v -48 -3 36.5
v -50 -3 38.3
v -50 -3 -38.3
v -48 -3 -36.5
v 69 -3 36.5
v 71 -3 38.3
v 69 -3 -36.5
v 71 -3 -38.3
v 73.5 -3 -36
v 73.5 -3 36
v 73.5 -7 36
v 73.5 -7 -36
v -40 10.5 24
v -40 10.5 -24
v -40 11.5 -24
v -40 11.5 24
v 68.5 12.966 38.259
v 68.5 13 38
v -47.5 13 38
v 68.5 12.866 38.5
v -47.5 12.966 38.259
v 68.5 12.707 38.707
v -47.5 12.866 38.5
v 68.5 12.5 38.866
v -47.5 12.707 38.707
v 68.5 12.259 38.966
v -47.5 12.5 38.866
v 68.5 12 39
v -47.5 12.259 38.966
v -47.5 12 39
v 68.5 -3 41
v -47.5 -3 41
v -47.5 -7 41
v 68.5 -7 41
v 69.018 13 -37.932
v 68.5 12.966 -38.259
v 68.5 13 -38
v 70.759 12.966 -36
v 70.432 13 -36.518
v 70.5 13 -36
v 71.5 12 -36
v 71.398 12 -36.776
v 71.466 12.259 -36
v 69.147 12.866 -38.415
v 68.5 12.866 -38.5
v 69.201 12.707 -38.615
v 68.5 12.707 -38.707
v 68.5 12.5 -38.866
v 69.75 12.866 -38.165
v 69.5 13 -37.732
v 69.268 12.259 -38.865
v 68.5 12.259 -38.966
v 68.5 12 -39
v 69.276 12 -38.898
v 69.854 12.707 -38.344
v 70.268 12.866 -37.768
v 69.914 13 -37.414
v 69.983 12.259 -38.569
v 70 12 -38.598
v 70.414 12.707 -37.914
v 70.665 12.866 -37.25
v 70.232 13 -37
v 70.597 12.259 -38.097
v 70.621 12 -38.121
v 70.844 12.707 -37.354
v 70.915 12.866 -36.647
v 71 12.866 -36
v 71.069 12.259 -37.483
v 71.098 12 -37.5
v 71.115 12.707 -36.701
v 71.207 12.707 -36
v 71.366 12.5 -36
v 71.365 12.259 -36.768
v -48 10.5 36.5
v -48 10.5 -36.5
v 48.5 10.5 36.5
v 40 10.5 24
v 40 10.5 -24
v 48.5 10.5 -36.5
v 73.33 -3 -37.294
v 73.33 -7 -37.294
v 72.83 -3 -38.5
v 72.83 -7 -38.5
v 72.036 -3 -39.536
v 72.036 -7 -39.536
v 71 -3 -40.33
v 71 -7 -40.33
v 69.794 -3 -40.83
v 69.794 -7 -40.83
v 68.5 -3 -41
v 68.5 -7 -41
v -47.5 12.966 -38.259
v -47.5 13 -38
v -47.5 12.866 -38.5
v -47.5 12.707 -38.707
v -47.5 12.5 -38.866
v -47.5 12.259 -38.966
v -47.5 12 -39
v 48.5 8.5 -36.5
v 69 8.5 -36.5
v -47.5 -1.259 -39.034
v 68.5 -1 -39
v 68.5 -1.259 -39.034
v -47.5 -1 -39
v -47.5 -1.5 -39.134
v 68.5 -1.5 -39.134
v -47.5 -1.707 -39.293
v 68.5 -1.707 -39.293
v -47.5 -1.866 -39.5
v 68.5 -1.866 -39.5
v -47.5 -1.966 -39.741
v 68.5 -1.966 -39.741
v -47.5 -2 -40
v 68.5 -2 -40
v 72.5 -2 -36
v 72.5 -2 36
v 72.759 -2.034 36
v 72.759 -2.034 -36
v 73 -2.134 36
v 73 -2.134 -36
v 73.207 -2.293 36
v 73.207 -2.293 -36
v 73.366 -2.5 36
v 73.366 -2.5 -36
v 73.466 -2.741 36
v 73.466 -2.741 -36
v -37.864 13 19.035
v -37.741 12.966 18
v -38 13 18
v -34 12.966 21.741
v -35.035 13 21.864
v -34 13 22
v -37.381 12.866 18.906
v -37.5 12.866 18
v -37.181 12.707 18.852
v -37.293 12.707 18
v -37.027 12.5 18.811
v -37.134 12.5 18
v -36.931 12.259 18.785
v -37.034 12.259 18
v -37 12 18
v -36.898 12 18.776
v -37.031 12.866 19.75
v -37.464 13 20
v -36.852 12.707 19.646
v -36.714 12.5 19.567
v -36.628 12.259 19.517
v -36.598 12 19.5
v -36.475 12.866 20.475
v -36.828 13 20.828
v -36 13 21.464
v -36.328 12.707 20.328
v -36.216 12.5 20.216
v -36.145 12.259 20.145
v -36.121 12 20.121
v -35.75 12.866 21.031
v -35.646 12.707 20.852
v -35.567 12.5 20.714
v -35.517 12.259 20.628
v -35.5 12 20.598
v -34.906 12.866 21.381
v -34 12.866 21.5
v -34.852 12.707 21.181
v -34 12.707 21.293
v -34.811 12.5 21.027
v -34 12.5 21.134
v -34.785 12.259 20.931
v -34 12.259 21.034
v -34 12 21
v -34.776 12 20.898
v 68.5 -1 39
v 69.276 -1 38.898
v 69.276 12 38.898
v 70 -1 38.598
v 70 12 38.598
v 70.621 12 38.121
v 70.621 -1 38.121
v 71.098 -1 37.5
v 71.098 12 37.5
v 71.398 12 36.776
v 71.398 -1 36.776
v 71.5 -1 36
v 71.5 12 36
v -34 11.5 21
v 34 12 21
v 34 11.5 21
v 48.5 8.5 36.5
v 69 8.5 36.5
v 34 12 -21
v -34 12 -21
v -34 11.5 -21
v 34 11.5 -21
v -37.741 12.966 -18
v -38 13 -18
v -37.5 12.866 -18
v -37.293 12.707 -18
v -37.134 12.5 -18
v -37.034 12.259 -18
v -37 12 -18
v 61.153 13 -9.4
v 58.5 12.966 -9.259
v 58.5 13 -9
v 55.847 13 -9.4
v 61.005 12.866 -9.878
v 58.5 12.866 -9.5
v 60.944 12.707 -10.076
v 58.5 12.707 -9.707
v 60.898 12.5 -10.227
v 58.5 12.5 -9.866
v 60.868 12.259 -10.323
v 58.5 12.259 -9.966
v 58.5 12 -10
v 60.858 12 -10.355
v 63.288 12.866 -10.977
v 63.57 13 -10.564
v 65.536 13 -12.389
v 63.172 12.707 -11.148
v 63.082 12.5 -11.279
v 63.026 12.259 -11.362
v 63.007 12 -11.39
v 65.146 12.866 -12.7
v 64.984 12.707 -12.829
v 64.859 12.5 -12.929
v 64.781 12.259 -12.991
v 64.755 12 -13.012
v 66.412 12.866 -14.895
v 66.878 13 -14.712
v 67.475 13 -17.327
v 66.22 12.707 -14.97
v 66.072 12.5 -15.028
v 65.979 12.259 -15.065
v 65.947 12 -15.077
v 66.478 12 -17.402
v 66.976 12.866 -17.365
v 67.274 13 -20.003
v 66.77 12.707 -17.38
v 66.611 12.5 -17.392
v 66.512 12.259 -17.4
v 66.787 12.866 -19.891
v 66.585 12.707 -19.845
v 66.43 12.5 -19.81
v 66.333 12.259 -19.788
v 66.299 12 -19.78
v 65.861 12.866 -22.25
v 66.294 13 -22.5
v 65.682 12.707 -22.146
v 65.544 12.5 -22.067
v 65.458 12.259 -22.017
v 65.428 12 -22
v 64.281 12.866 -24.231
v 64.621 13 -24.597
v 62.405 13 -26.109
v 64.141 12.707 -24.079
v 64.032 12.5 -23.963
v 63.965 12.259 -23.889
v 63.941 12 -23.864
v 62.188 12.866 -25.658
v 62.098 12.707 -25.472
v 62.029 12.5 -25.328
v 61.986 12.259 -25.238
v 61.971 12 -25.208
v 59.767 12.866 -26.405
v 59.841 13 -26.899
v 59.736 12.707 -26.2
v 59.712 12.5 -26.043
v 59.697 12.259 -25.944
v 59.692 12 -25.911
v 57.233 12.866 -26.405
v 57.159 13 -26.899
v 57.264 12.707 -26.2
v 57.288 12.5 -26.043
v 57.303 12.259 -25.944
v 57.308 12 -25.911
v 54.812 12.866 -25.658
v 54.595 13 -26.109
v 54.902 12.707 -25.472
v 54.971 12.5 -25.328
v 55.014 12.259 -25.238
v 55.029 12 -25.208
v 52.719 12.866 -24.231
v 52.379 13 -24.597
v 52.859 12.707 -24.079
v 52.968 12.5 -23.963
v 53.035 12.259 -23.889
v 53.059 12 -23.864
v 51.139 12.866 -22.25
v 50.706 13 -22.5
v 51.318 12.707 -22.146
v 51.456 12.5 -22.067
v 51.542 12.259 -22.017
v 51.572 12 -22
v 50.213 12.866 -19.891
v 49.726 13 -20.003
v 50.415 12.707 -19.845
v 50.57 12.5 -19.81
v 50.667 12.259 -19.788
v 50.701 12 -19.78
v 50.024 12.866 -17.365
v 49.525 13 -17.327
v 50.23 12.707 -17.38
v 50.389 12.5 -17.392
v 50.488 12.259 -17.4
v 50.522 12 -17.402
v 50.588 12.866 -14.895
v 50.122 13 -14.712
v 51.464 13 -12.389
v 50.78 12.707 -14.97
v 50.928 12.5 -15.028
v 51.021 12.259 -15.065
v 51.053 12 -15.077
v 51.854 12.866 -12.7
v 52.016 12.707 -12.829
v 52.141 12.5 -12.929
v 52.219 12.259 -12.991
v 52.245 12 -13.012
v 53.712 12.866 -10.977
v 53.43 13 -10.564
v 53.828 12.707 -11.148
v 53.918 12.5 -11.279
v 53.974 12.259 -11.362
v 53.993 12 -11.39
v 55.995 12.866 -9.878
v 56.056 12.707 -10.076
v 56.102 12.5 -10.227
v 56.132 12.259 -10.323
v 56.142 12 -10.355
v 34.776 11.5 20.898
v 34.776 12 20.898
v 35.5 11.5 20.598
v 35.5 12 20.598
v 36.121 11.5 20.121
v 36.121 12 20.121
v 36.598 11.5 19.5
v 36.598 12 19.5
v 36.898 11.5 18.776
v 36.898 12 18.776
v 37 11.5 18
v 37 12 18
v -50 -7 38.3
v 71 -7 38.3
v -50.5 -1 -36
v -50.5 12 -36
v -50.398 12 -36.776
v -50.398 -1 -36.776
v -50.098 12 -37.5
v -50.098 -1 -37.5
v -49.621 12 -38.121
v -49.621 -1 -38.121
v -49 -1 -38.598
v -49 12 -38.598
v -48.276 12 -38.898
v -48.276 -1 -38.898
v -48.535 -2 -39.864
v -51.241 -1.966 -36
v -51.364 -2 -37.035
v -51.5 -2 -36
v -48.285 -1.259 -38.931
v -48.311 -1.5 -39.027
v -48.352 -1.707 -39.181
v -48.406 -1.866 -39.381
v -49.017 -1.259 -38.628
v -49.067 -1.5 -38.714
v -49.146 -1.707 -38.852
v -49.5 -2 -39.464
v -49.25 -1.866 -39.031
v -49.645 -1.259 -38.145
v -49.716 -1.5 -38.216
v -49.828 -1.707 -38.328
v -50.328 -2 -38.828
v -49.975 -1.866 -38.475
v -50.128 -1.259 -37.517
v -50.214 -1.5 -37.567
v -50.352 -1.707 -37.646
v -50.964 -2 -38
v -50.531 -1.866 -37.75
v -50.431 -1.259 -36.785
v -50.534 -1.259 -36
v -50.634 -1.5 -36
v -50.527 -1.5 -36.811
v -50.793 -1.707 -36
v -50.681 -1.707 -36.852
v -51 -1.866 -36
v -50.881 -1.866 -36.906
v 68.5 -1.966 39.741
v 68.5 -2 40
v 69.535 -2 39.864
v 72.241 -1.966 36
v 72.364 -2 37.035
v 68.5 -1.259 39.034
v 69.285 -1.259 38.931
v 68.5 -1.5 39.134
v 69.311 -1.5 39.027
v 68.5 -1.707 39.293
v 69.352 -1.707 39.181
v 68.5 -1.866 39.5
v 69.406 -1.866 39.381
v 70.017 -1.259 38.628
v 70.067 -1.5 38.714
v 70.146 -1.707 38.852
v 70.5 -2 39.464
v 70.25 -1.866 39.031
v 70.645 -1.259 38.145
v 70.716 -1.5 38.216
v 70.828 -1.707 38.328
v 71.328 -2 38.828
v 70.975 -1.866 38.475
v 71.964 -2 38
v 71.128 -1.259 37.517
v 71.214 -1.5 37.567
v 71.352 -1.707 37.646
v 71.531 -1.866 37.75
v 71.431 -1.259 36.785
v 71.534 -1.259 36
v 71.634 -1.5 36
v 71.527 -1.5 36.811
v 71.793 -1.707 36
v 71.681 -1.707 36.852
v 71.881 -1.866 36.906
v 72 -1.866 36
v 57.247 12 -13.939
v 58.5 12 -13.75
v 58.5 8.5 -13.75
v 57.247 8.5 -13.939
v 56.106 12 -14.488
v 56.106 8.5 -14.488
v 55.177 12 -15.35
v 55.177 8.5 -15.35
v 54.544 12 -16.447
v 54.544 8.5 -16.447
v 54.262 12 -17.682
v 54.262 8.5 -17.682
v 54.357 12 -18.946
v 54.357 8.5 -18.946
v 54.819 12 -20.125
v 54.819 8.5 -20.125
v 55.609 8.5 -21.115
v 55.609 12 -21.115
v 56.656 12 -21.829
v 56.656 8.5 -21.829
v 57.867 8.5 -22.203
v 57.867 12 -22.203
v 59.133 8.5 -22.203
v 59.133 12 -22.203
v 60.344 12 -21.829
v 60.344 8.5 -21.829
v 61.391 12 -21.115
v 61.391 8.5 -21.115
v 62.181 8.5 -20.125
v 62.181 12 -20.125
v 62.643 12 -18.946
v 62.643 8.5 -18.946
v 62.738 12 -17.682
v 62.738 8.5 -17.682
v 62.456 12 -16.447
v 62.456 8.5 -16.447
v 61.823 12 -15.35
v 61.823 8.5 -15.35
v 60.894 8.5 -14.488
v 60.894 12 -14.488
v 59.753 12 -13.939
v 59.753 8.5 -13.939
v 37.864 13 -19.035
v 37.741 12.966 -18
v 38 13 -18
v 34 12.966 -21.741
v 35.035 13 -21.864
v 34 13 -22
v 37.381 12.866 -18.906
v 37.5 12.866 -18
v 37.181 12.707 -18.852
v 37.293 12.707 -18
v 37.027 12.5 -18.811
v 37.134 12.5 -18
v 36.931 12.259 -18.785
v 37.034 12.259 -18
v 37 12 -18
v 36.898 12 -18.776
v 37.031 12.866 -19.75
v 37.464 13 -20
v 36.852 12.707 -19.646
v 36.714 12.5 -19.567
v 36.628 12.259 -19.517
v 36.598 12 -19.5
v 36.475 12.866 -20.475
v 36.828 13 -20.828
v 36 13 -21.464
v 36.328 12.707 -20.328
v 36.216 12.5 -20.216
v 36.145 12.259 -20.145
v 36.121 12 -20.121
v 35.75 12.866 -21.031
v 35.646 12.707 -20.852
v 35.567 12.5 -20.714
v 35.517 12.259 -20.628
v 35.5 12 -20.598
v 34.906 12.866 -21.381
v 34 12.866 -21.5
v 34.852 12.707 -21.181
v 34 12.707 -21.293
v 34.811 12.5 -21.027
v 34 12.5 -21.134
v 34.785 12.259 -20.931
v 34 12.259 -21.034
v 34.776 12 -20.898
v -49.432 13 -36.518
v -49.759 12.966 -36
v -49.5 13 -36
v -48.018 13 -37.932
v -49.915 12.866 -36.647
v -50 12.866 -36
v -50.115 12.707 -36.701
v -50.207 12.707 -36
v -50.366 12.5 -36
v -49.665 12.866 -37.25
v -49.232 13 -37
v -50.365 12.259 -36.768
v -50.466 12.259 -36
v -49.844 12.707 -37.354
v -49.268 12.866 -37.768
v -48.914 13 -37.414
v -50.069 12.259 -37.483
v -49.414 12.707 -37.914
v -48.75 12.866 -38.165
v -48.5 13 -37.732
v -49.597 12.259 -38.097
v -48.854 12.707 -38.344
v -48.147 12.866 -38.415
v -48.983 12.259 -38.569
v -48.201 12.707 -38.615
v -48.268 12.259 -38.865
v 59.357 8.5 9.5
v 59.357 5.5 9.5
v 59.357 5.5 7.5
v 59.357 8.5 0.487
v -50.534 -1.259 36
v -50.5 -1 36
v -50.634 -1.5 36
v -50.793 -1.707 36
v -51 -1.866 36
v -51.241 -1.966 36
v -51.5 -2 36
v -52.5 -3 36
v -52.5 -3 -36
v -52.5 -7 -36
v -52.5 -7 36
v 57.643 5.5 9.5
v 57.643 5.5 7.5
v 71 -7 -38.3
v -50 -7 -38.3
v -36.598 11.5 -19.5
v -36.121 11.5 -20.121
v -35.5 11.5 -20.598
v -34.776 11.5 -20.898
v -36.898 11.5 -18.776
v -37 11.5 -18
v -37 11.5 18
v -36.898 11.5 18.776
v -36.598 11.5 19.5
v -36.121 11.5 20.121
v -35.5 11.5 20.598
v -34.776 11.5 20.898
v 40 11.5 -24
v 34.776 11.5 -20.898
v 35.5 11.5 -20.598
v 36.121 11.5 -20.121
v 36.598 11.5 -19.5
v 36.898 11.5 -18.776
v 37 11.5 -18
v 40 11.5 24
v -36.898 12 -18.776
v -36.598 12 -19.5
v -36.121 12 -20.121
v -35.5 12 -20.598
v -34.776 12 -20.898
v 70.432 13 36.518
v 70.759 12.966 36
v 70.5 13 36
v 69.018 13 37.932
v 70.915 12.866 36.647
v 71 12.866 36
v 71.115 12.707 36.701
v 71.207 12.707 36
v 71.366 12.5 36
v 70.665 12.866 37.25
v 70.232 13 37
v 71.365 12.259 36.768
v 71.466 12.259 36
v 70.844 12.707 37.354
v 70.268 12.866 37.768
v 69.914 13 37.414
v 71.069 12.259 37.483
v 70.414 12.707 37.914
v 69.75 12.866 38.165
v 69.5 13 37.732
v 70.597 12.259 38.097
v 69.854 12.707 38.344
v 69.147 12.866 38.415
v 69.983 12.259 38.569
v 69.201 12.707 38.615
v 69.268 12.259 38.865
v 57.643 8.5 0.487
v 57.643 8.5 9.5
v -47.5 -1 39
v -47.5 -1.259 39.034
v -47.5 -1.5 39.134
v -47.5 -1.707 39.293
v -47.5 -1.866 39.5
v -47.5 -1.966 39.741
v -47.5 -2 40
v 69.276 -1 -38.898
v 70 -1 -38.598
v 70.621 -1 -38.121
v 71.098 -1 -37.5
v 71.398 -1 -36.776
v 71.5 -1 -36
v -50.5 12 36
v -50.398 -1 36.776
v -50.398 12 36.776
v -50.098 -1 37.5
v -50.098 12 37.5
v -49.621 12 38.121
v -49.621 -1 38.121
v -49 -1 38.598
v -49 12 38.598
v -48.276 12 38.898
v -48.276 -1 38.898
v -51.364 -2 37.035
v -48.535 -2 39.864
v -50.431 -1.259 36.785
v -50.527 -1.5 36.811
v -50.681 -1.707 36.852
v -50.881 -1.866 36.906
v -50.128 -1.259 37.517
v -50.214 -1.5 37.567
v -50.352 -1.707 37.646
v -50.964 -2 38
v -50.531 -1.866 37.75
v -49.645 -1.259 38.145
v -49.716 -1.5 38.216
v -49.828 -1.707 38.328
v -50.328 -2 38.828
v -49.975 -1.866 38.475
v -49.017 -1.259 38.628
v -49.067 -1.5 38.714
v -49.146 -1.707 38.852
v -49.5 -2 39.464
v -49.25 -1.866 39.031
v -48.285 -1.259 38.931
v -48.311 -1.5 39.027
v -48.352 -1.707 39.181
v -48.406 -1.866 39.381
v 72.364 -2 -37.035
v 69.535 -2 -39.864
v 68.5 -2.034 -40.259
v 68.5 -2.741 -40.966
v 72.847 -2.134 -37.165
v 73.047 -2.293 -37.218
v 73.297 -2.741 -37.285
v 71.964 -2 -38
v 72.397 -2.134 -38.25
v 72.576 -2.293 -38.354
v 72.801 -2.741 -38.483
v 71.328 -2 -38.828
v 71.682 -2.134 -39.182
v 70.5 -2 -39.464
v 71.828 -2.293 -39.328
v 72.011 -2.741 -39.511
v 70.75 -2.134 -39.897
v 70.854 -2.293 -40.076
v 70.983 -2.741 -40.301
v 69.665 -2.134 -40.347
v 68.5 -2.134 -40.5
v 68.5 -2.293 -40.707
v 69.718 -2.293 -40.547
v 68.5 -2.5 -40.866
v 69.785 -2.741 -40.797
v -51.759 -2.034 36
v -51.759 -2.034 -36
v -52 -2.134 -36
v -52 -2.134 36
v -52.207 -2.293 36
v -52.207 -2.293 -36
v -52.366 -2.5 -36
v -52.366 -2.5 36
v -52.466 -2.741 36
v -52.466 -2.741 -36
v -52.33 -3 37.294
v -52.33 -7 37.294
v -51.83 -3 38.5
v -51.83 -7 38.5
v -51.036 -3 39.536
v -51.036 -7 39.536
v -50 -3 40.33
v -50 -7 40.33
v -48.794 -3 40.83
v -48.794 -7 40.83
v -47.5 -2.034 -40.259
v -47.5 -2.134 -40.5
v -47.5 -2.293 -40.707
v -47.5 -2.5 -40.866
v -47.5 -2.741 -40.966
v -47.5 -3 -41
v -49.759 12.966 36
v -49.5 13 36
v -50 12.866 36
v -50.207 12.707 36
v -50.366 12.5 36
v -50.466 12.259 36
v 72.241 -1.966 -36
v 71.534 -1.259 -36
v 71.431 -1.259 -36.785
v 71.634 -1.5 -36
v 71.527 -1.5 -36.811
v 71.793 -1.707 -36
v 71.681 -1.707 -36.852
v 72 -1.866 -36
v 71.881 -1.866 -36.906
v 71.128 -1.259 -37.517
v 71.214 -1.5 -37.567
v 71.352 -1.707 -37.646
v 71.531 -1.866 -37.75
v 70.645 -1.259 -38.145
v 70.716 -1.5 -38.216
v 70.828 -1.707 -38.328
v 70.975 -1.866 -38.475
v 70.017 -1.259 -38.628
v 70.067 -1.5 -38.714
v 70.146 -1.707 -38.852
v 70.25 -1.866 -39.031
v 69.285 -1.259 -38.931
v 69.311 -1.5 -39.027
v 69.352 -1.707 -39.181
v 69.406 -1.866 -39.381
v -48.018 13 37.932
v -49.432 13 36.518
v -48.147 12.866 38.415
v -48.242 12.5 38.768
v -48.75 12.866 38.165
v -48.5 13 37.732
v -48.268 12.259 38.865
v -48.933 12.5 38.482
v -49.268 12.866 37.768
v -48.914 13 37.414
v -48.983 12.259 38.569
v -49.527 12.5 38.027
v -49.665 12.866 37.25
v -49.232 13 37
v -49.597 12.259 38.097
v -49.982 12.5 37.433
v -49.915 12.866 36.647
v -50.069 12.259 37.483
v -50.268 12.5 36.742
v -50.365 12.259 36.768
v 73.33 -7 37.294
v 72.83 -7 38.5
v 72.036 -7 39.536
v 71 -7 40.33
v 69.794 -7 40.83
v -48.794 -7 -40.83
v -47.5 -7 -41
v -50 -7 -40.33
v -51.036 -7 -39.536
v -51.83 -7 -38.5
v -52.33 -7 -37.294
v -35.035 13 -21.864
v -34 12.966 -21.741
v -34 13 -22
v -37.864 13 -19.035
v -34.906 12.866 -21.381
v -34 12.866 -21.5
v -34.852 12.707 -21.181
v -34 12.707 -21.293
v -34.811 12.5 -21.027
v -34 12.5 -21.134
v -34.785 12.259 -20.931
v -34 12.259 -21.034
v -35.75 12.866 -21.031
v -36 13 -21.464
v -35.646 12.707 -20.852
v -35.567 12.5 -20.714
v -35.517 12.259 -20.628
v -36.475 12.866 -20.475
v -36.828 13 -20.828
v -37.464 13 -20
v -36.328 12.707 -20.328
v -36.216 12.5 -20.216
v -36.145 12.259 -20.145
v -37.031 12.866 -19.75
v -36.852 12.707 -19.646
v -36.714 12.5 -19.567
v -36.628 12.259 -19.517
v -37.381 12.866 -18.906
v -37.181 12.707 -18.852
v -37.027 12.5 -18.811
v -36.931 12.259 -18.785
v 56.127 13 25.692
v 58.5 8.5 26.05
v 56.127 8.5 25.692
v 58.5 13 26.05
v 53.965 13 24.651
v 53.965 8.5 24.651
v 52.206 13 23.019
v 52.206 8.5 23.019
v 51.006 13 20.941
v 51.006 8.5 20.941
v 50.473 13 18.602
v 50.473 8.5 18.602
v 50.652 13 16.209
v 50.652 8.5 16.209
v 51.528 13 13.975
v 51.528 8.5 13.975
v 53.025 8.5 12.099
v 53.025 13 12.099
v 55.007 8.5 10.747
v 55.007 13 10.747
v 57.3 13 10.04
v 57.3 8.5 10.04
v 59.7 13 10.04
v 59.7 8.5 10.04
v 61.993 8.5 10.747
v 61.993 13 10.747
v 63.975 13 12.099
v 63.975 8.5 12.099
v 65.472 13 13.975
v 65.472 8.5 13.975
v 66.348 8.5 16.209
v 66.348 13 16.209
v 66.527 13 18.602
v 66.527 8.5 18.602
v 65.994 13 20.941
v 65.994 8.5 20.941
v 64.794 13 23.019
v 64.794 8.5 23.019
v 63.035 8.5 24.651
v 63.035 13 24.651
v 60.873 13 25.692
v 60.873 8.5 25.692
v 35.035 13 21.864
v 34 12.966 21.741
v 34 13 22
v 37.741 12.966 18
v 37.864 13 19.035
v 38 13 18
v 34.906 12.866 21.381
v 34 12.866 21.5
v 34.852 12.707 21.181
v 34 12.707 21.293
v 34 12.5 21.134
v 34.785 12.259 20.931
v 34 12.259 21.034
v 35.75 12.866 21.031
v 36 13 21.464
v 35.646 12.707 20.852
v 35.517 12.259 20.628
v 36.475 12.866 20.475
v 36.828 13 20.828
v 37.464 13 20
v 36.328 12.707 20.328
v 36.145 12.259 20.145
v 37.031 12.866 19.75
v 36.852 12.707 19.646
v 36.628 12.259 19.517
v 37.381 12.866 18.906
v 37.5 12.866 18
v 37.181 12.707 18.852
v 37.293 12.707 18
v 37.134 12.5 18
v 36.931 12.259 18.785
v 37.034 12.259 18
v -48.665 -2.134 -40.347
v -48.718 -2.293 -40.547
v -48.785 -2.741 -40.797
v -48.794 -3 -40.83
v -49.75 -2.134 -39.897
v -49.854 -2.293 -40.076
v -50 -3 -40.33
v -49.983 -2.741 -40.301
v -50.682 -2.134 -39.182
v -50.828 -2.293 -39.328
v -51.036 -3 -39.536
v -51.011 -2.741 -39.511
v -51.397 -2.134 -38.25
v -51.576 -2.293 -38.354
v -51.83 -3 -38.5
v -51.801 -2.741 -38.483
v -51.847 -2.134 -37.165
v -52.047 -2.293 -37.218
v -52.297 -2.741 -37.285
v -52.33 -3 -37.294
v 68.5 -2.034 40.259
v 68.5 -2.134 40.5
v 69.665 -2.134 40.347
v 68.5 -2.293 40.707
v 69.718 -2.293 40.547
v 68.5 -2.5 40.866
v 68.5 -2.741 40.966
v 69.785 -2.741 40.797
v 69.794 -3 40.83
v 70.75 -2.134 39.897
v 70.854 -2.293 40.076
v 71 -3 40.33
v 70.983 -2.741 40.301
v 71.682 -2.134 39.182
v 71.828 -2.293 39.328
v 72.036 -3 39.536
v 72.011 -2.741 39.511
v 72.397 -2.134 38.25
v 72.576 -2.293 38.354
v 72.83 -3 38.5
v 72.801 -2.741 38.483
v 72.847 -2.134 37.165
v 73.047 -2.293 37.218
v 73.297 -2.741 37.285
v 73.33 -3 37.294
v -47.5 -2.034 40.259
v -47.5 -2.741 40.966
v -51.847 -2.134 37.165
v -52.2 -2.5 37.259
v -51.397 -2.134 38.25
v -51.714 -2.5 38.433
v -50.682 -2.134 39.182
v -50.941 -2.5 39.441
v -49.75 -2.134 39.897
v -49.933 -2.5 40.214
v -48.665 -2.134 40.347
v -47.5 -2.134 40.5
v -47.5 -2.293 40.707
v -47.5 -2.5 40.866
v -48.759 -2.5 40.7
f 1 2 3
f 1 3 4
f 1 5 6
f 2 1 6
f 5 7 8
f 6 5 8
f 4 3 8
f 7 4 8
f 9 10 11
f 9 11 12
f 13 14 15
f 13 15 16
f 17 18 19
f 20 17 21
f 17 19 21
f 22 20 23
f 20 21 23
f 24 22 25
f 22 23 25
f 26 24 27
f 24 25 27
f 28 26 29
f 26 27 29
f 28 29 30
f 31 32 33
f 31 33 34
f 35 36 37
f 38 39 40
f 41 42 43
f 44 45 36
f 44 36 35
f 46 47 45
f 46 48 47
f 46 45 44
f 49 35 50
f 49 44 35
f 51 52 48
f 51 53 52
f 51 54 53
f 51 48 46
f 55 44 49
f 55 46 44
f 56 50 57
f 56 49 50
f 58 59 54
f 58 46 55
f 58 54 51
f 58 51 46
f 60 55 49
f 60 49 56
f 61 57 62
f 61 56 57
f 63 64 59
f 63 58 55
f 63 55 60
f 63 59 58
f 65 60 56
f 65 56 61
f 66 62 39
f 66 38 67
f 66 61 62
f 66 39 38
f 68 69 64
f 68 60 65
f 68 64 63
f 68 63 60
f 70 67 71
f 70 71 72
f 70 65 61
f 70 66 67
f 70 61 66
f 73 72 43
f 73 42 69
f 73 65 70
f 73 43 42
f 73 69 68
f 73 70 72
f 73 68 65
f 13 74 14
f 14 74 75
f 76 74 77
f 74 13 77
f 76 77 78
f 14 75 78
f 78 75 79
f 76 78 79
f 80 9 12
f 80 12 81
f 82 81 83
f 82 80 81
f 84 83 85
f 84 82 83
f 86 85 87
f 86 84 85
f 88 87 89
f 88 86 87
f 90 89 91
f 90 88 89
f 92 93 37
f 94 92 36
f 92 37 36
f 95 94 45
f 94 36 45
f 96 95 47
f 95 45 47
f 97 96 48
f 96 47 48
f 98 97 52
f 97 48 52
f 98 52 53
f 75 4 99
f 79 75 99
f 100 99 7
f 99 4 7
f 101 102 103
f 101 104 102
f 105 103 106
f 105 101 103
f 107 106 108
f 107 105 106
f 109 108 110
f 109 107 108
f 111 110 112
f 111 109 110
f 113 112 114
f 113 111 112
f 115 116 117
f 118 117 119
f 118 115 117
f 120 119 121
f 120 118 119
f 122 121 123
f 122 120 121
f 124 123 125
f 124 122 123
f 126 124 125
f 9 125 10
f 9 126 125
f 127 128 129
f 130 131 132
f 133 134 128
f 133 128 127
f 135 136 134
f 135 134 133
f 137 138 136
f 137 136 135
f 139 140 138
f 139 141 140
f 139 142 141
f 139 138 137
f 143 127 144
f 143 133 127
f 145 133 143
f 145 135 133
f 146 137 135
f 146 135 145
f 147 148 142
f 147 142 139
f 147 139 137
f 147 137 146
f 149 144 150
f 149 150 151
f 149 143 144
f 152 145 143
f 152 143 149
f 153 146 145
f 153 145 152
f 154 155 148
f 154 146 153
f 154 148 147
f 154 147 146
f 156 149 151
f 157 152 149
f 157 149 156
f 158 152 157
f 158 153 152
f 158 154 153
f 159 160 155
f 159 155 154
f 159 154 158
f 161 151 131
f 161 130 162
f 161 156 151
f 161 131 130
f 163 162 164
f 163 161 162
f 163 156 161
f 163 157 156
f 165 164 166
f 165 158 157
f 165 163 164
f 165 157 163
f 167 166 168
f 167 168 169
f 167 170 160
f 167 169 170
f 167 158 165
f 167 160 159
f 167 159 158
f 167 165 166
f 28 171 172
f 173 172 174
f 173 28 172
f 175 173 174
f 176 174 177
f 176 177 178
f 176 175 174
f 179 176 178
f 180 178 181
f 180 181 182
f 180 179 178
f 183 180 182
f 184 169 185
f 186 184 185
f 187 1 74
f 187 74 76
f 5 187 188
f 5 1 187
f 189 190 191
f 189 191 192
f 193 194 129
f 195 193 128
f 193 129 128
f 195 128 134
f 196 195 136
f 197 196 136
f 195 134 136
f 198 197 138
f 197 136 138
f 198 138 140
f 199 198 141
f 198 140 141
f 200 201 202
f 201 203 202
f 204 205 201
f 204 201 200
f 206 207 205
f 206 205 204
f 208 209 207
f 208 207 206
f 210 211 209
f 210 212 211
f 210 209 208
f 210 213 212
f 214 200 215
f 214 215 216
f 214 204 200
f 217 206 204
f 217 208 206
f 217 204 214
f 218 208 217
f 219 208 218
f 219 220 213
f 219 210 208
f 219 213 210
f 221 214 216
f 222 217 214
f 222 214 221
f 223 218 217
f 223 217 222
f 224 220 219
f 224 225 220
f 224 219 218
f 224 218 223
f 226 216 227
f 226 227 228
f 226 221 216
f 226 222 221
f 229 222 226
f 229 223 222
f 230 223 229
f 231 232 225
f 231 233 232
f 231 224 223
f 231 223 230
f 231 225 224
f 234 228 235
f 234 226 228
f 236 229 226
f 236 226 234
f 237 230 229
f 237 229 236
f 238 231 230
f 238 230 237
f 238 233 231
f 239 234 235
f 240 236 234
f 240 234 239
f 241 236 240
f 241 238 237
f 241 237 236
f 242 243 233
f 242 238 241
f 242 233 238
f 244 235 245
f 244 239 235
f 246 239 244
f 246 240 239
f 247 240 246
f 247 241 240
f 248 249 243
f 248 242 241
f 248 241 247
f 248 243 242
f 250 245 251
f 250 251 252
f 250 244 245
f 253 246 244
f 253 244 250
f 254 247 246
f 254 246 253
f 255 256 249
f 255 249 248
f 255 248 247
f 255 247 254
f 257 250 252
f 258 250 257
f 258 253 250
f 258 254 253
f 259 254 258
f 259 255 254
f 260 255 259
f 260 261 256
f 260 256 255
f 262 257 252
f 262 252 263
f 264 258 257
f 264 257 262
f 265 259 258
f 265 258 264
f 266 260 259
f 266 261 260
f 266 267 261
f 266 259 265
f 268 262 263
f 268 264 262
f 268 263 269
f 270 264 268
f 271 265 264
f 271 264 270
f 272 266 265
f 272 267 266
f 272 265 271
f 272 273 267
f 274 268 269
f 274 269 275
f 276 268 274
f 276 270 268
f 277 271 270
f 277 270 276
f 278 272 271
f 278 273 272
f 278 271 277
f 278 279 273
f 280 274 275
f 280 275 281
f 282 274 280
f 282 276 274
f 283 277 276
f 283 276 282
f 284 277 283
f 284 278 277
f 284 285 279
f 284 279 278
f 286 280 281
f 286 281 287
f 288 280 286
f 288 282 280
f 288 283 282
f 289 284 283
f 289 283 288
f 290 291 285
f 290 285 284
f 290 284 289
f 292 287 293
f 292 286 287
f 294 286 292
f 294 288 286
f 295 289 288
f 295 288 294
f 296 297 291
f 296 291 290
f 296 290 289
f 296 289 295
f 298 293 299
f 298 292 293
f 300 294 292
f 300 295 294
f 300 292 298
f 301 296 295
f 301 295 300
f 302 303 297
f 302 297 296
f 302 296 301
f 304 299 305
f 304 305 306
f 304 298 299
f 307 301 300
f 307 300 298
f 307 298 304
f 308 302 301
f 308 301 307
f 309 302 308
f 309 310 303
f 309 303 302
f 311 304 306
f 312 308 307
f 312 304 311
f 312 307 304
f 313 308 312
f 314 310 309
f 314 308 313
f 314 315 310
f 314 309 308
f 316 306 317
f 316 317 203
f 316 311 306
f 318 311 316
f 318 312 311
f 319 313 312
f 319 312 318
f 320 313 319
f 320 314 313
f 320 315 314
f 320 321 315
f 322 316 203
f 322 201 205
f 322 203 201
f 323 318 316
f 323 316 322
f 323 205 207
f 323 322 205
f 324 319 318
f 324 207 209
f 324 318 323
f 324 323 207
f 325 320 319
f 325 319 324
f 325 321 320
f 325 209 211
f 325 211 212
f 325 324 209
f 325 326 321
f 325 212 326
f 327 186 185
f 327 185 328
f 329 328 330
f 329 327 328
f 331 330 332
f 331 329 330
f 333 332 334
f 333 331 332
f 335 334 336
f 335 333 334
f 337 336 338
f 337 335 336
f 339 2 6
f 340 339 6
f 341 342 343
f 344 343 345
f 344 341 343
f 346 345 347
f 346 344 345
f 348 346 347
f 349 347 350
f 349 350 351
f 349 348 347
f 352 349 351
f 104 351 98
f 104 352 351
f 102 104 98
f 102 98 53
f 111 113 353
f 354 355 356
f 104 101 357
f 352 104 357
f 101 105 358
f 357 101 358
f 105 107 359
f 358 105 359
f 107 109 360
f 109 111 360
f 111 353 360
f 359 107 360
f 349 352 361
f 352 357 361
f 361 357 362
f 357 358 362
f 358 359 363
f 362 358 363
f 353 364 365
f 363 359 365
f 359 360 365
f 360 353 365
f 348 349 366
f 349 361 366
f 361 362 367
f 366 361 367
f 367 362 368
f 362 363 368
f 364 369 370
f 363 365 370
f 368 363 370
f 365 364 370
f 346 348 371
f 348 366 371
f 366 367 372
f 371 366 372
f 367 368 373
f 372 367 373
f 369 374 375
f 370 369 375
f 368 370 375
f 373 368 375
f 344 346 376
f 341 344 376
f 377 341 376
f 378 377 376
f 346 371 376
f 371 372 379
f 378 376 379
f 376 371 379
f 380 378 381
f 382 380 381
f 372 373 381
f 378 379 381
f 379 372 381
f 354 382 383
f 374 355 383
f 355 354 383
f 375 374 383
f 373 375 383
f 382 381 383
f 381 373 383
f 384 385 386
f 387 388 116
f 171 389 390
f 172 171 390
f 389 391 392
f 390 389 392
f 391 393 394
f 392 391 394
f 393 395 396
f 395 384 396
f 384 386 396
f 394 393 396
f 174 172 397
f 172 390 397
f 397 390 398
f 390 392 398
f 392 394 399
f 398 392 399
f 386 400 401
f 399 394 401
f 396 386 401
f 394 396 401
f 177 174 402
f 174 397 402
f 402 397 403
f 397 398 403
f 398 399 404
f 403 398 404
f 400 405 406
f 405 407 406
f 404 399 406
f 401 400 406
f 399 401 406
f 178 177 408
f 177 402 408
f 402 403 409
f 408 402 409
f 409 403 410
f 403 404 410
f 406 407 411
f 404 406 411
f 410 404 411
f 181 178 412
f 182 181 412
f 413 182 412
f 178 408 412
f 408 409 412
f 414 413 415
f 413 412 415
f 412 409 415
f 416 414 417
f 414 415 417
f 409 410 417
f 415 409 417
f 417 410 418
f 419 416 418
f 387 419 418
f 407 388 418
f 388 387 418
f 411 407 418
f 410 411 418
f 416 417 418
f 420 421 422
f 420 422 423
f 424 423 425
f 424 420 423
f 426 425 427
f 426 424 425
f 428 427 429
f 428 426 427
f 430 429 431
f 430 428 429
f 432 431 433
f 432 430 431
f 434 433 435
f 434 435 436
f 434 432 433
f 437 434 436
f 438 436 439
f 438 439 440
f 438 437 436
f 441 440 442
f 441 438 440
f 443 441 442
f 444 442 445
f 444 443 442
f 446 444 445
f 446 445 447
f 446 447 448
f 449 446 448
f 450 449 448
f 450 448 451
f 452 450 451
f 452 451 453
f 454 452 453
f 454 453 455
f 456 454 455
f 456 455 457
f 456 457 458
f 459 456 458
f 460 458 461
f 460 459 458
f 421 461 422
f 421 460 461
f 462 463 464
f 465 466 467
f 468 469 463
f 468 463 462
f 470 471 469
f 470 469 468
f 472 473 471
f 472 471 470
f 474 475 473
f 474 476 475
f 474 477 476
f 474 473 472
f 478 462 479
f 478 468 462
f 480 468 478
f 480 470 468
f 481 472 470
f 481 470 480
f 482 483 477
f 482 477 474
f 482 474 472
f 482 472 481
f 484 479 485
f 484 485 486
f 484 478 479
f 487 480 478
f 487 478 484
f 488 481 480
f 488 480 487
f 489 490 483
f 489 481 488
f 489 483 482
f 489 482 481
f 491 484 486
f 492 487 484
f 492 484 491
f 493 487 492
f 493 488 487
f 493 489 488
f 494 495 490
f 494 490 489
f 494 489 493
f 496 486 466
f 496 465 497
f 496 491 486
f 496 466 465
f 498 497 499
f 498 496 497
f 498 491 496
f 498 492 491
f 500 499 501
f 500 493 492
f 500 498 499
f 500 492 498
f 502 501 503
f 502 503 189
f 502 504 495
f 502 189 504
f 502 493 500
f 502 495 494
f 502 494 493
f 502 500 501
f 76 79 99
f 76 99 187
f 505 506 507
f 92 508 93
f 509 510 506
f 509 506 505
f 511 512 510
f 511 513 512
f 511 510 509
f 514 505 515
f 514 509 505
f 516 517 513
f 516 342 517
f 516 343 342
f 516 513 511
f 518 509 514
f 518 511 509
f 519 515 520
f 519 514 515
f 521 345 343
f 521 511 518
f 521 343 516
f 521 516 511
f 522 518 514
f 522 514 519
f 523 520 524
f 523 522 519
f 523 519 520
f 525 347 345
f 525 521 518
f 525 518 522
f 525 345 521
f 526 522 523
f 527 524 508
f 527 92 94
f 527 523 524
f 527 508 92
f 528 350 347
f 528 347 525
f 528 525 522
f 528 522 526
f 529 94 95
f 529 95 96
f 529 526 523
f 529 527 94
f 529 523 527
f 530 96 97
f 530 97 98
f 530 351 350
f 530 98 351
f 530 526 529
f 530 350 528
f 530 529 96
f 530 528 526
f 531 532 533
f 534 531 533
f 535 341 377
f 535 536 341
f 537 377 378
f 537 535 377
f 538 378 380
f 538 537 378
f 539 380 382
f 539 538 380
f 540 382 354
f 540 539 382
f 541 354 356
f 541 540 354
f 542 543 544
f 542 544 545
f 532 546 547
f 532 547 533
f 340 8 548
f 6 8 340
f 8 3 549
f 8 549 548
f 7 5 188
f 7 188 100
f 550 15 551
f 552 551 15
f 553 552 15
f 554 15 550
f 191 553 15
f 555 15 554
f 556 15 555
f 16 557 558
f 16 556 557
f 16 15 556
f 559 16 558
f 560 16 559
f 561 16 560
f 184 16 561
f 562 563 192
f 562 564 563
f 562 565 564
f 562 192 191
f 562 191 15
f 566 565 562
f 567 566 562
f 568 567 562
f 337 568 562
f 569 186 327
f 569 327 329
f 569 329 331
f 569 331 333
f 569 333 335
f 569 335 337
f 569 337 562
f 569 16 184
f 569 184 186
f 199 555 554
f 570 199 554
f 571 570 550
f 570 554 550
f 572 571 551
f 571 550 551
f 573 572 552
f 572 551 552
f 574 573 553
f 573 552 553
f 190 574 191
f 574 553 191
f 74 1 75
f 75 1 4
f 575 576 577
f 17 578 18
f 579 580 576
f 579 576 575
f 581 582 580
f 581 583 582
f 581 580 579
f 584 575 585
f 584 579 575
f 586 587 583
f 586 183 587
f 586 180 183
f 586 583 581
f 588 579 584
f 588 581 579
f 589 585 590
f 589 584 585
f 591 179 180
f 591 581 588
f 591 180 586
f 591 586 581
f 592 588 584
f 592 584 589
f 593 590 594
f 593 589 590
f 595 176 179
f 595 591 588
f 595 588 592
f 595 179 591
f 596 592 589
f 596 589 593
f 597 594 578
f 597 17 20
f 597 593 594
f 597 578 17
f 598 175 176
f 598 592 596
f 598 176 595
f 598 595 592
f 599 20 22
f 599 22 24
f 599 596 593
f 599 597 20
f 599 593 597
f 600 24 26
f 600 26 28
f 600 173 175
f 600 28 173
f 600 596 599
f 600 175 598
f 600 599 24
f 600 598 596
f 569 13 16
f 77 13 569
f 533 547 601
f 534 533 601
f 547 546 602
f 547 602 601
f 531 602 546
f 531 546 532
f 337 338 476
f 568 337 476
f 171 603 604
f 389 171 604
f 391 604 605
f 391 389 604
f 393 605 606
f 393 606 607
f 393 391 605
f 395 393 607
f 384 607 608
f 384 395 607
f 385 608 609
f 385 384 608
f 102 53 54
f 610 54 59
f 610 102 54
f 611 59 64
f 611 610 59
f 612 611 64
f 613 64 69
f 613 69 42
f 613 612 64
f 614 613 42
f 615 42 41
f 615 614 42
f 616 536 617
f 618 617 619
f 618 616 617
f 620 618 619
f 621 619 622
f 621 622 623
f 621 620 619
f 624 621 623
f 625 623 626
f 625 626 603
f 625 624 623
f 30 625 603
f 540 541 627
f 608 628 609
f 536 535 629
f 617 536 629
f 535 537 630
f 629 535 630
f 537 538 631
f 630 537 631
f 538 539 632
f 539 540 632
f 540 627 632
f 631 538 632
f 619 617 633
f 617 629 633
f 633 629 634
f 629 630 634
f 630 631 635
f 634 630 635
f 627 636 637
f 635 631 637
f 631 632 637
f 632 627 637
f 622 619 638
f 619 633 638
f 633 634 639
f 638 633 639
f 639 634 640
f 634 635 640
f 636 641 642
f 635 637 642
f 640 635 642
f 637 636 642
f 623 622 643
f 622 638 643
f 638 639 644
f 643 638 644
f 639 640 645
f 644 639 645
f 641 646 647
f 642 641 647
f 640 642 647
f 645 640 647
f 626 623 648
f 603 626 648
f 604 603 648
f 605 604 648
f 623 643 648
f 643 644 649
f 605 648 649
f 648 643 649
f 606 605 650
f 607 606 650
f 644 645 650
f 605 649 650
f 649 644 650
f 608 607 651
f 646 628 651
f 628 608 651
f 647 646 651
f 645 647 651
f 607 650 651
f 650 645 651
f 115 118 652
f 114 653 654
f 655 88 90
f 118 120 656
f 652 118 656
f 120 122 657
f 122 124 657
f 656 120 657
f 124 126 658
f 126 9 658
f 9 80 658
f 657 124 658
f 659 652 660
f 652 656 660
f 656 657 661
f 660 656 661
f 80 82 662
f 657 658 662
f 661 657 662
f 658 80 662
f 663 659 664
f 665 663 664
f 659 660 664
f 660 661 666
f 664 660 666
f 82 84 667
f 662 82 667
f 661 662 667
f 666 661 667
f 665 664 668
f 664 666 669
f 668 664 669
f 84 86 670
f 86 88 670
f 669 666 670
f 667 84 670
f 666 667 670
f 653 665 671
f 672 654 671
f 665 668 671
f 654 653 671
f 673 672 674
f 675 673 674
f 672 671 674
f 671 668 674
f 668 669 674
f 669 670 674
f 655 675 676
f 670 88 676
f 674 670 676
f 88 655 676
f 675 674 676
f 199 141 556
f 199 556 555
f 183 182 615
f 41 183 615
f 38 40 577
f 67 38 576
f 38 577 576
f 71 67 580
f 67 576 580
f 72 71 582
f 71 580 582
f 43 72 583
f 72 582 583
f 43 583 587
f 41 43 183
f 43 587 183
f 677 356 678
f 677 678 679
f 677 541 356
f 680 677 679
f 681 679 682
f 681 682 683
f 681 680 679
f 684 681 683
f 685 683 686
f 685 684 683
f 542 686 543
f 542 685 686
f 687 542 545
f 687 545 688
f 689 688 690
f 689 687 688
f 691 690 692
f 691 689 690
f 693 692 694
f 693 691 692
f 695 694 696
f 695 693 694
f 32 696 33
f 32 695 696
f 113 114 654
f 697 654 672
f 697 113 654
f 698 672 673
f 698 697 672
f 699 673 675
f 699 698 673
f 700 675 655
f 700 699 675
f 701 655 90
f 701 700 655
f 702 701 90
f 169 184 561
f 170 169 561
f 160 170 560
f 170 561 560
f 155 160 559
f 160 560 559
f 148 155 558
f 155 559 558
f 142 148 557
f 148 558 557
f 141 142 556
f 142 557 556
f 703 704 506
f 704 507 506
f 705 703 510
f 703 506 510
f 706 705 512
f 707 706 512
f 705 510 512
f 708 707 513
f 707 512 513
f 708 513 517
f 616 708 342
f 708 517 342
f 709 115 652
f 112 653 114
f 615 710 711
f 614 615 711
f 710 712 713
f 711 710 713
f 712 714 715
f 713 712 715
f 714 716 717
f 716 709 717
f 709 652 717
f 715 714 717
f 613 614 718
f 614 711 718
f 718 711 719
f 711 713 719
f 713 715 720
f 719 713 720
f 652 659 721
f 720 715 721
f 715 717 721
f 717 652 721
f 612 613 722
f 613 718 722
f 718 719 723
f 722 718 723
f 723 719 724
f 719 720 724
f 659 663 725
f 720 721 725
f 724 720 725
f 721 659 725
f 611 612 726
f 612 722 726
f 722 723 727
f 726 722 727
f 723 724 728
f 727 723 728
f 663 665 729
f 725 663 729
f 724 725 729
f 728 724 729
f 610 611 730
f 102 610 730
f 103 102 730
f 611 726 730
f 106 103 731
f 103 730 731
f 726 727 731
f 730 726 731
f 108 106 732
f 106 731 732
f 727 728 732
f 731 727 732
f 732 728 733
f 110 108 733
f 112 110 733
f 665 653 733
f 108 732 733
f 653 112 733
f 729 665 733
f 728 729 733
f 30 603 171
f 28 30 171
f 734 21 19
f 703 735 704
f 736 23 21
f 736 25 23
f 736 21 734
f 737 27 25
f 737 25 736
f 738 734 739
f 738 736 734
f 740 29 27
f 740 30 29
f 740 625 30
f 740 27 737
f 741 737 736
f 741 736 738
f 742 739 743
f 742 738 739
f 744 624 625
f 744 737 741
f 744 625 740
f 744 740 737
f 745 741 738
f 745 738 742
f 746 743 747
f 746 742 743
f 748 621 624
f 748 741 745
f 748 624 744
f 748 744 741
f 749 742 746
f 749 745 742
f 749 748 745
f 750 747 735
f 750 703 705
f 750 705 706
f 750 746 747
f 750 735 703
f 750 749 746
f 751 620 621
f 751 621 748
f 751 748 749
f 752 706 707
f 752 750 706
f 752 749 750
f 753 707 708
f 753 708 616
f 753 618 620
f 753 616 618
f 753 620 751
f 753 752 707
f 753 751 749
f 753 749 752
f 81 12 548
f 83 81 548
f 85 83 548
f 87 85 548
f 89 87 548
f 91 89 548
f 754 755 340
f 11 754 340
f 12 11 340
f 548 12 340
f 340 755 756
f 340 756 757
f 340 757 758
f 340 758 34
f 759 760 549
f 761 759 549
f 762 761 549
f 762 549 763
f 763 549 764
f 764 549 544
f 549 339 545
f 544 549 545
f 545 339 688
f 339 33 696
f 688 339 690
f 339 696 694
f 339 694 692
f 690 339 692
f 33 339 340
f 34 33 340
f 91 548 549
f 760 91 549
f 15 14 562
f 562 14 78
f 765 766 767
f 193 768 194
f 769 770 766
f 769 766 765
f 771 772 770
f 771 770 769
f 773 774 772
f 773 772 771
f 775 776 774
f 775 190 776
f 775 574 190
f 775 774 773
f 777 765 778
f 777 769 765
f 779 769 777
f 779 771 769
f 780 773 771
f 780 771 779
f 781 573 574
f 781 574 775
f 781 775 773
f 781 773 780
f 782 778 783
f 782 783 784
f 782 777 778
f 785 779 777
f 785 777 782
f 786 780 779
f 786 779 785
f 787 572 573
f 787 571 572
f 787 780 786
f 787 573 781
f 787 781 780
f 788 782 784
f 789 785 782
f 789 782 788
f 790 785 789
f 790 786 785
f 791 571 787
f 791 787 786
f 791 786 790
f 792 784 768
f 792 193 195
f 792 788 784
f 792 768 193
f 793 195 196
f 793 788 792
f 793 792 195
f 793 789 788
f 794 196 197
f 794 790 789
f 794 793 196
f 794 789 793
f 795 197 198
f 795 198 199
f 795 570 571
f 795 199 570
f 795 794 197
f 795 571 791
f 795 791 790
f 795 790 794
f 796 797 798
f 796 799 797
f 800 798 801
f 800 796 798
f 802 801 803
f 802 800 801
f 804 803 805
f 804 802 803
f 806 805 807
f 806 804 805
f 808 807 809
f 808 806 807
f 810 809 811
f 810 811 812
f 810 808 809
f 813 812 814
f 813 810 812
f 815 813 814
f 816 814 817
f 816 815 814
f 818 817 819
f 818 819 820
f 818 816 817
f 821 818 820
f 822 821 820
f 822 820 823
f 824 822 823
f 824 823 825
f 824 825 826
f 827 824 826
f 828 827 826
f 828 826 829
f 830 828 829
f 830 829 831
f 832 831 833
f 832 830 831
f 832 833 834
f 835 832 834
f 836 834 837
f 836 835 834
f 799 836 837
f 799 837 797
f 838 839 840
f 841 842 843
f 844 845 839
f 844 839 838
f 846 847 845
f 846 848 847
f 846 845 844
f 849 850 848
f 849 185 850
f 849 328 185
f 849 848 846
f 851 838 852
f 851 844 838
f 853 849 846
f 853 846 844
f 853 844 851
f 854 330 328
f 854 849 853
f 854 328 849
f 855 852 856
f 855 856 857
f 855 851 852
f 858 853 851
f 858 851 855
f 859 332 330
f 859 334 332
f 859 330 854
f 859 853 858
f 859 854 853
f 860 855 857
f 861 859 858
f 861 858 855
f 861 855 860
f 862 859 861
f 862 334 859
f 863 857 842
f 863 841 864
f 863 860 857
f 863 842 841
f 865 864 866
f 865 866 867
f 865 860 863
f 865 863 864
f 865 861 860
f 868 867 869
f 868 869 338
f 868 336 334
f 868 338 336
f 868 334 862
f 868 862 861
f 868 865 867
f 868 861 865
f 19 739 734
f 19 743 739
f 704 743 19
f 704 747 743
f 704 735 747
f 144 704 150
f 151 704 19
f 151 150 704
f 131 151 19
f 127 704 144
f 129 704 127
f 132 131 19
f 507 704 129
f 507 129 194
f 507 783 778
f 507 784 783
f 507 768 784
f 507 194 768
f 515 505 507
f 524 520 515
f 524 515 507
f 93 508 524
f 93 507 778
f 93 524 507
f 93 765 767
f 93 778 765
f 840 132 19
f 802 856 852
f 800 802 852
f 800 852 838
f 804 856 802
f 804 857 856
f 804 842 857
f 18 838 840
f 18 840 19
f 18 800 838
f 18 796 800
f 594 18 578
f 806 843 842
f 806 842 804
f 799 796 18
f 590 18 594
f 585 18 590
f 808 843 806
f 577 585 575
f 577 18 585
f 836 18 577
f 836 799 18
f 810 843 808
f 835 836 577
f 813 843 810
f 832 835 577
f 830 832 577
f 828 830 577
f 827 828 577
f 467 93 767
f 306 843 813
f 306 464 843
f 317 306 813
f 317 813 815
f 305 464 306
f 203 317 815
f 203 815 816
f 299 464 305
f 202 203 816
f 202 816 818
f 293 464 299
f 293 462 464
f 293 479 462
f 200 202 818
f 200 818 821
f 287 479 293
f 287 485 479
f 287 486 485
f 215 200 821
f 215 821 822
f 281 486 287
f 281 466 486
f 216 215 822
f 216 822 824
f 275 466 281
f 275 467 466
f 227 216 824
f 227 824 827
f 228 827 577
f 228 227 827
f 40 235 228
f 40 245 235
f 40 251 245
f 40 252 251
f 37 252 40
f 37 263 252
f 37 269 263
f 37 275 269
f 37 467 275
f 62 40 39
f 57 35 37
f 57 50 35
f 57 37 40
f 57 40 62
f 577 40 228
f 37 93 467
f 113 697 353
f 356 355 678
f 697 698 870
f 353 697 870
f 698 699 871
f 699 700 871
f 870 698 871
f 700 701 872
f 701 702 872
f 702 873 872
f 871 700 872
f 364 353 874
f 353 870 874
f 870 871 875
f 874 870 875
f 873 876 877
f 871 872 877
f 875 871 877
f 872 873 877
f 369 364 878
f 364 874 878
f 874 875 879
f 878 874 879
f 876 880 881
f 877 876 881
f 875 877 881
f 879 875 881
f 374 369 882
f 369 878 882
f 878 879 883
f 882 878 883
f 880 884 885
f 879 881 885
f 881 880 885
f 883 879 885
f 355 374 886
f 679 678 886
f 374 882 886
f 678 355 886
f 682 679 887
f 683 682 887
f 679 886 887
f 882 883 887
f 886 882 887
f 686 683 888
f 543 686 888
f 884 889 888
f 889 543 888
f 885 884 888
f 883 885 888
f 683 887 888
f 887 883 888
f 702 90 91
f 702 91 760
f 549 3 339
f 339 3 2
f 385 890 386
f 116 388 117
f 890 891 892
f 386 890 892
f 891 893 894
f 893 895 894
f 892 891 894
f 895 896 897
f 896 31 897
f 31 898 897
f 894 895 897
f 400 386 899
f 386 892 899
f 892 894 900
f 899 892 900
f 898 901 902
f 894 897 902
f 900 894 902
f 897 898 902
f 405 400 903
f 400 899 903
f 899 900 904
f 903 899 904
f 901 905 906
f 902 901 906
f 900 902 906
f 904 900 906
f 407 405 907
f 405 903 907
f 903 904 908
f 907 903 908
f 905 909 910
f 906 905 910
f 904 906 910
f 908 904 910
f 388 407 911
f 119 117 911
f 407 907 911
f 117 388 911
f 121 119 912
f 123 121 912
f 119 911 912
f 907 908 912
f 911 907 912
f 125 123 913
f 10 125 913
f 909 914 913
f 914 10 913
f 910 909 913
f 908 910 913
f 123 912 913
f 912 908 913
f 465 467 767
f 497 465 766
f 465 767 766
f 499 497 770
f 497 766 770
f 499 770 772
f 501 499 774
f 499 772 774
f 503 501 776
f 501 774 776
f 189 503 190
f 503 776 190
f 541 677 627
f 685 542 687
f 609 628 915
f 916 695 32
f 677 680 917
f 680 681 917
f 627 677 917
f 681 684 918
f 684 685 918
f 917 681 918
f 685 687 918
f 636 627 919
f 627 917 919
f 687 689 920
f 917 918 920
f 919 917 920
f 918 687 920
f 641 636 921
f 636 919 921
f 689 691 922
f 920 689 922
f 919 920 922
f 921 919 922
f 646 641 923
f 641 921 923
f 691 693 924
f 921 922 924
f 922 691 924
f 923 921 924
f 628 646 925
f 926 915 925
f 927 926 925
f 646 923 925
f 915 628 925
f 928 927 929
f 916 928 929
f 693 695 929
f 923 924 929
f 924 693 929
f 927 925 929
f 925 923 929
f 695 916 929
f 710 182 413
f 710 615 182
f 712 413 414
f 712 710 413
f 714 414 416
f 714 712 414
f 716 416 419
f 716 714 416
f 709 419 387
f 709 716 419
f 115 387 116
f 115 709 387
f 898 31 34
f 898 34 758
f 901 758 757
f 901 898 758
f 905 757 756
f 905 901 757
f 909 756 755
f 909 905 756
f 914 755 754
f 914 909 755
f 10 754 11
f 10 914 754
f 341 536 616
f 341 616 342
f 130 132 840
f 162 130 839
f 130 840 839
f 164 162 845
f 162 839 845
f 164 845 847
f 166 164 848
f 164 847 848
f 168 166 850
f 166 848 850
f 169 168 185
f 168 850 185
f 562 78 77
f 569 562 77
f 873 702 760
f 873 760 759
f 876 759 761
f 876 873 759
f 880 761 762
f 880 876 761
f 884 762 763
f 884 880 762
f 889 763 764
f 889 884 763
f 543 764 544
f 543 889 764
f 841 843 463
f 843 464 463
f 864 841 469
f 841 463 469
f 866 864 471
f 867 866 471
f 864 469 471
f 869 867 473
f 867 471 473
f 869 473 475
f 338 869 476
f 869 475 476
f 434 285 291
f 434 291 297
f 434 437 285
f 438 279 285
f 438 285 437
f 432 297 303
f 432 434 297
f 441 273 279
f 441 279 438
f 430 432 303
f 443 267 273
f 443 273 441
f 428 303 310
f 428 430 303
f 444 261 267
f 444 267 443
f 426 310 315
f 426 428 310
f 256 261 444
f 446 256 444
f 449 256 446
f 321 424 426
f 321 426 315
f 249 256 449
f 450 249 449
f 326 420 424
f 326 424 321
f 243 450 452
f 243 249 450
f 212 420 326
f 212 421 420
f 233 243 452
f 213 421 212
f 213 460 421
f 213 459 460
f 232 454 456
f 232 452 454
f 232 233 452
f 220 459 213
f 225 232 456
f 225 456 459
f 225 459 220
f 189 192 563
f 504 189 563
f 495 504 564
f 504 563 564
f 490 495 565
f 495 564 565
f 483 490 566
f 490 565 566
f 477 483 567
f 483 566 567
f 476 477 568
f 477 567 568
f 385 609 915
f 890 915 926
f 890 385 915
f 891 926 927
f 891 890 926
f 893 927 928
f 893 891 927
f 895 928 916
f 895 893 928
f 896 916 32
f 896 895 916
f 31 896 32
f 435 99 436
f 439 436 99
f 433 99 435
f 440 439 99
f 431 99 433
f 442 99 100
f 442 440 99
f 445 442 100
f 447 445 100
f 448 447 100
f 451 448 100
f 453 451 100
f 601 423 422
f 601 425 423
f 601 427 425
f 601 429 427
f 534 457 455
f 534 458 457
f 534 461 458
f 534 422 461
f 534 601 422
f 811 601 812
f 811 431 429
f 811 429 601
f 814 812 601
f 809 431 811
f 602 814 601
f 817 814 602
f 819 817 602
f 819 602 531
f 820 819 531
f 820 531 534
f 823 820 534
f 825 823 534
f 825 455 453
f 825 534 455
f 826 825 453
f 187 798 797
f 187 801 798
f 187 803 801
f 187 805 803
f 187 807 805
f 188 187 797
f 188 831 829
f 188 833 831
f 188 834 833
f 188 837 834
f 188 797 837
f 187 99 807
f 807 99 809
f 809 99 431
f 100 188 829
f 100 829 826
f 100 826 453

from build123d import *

# Parameters (mm, degrees)
SKETCH1_W                = 122
SKETCH1_H                = 78
SKETCH1_W_2              = 117
SKETCH1_H_2              = 73
BOSS_EXTRUDE1_DEPTH      = 16
SKETCH2_W                = 122
SKETCH2_H                = 78
SKETCH2_W_2              = 74
SKETCH2_H_2              = 42
BOSS_EXTRUDE2_DEPTH      = 2.5
SKETCH3_W                = 80
SKETCH3_H                = 48
CUT_EXTRUDE1_DEPTH       = 1
FILLET1_R                = 3
SKETCH4_R                = 4.25
SKETCH4_R_2              = 8.05
CUT_EXTRUDE2_DEPTH       = 84.00150601
SKETCH5_W                = 20.5
SKETCH5_H                = 73
SKETCH5_R                = 4.25
SKETCH5_R_2              = 8.05
BOSS_EXTRUDE3_DEPTH      = 2
SKETCH6_R                = 8
CUT_EXTRUDE3_DEPTH       = 1
FILLET2_R                = 3
SKETCH7_W                = 1.713480086
SKETCH7_H                = 2
BOSS_EXTRUDE4_DEPTH      = 3
BOSS_EXTRUDE5_DEPTH      = 1.713480086
FILLET3_R                = 1
FILLET4_R                = 1
FILLET5_R                = 1
BOSS_EXTRUDE6_DEPTH      = 4
BOSS_EXTRUDE6_DEPTH_BACK = 1
SKETCH10_W               = 121
SKETCH10_H               = 76.6
CUT_EXTRUDE4_DEPTH       = 86.669422783
FILLET10_R               = 1


with BuildPart() as part:
    # Sketch1 → Boss-Extrude1 (new body)
    with BuildSketch(Plane(origin=(0, -3, 0), x_dir=(1, 0, 0), z_dir=(0, 1, 0))):
        with Locations((10.5, 0)):
            Rectangle(SKETCH1_W, SKETCH1_H)
        with Locations((10.5, 0)):
            Rectangle(SKETCH1_W_2, SKETCH1_H_2, mode=Mode.SUBTRACT)
    extrude(amount=BOSS_EXTRUDE1_DEPTH)

    # Sketch2 → Boss-Extrude2 (add)
    with BuildSketch(Plane(origin=(0, 13, 0), x_dir=(1, 0, 0), z_dir=(0, 1, 0))):
        with Locations((10.5, 0)):
            Rectangle(SKETCH2_W, SKETCH2_H)
        Rectangle(SKETCH2_W_2, SKETCH2_H_2, mode=Mode.SUBTRACT)
    extrude(amount=-BOSS_EXTRUDE2_DEPTH)

    # Sketch3 → Cut-Extrude1 (cut)
    with BuildSketch(Plane.XZ.offset(-10.5)):
        Rectangle(SKETCH3_W, SKETCH3_H)
    extrude(amount=-CUT_EXTRUDE1_DEPTH, mode=Mode.SUBTRACT)

    # Fillet1
    fillet1_edges = [part.edges().sort_by_distance(p)[0] for p in [
        (-50.5, 5, -39),
        (71.5, 5, -39),
        (71.5, 5, 39),
        (-50.5, 5, 39),
    ]]
    fillet(fillet1_edges, radius=FILLET1_R)

    # Sketch4 → Cut-Extrude2 (cut, through all)
    with BuildSketch(Plane(origin=(0, 13, 0), x_dir=(1, 0, 0), z_dir=(0, 1, 0))):
        with Locations(Location((58.5, 18, 0), (0, 0, 270))):
            Circle(SKETCH4_R)
        with Locations(Location((58.5, -18, 0), (0, 0, 270))):
            Circle(SKETCH4_R_2)
    extrude(amount=-CUT_EXTRUDE2_DEPTH, mode=Mode.SUBTRACT)

    # Sketch5 → Boss-Extrude3 (add)
    with BuildSketch(Plane.XZ.offset(-10.5)):
        with Locations((58.75, 0)):
            Rectangle(SKETCH5_W, SKETCH5_H)
        with Locations(Location((58.5, -18, 0), (0, 0, 90))):
            Circle(SKETCH5_R, mode=Mode.SUBTRACT)
        with Locations(Location((58.5, 18, 0), (0, 0, 90))):
            Circle(SKETCH5_R_2, mode=Mode.SUBTRACT)
    extrude(amount=BOSS_EXTRUDE3_DEPTH)

    # Sketch6 → Cut-Extrude3 (cut)
    with BuildSketch(Plane(origin=(0, 13, 0), x_dir=(1, 0, 0), z_dir=(0, 1, 0))):
        with Locations(Location((58.5, 18, 0), (0, 0, 270))):
            Circle(SKETCH6_R)
    extrude(amount=-CUT_EXTRUDE3_DEPTH, mode=Mode.SUBTRACT)

    # Fillet2
    fillet2_edges = [part.edges().sort_by_distance(p)[0] for p in [
        (37, 12.25, 21),
        (-37, 12.25, 21),
        (37, 12.25, -21),
        (-37, 12.25, -21),
    ]]
    fillet(fillet2_edges, radius=FILLET2_R)

    # Sketch7 → Boss-Extrude4 (add)
    with BuildSketch(Plane.XZ.offset(-8.5)):
        with Locations((58.5, 8.5)):
            Rectangle(SKETCH7_W, SKETCH7_H)
    extrude(amount=BOSS_EXTRUDE4_DEPTH)

    # Sketch8 → Boss-Extrude5 (add)
    with BuildSketch(Plane.ZY.offset(-57.643259957)):
        Polygon((7.5, 5.5), (0.486710099, 8.5), (7.5, 8.5), align=None)
    extrude(amount=-BOSS_EXTRUDE5_DEPTH)

    # Fillet3
    fillet3_edges = [part.edges().sort_by_distance(p)[0] for p in [
        (-50.5, 13, 0),
        (10.5, 13, -39),
        (10.5, 13, 39),
        (71.5, 13, 0),
        (70.621320344, 13, 38.121320344),
        (70.621320344, 13, -38.121320344),
        (-49.621320344, 13, 38.121320344),
        (-49.621320344, 13, -38.121320344),
    ]]
    fillet(fillet3_edges, radius=FILLET3_R)

    # Fillet4
    fillet4_edges = [part.edges().sort_by_distance(p)[0] for p in [
        (37, 13, 0),
        (0, 13, 21),
        (-37, 13, 0),
        (0, 13, -21),
        (36.121320344, 13, 20.121320344),
        (-36.121320344, 13, 20.121320344),
        (-36.121320344, 13, -20.121320344),
        (36.121320344, 13, -20.121320344),
    ]]
    fillet(fillet4_edges, radius=FILLET4_R)

    # Fillet5
    fillet5_edges = [part.edges().sort_by_distance(p)[0] for p in [
        (58.5, 13, -26),
    ]]
    fillet(fillet5_edges, radius=FILLET5_R - 0.0001)  # a hair under: the kernel refuses the full size

    # Sketch9 → Boss-Extrude6 (add, two sides: drawn at the far end of the back side and taken through both)
    with BuildSketch(Plane.XZ.offset(3).offset(-BOSS_EXTRUDE6_DEPTH_BACK)):
        with BuildLine():
            Line((-52.5, -36), (-52.5, 36))
            ThreePointArc((-52.5, 36), (-51.035533906, 39.535533906), (-47.5, 41))
            Line((-47.5, 41), (68.5, 41))
            ThreePointArc((68.5, 41), (72.035533906, 39.535533906), (73.5, 36))
            Line((73.5, 36), (73.5, -36))
            ThreePointArc((73.5, -36), (72.035533906, -39.535533906), (68.5, -41))
            Line((68.5, -41), (-47.5, -41))
            ThreePointArc((-47.5, -41), (-51.035533906, -39.535533906), (-52.5, -36))
        make_face()
        with BuildLine():
            Line((-48, 38.3), (69, 38.3))
            ThreePointArc((69, 38.3), (70.414213562, 37.714213562), (71, 36.3))
            Line((71, 36.3), (71, -36.3))
            ThreePointArc((71, -36.3), (70.414213562, -37.714213562), (69, -38.3))
            Line((69, -38.3), (-48, -38.3))
            ThreePointArc((-48, -38.3), (-49.414213562, -37.714213562), (-50, -36.3))
            Line((-50, -36.3), (-50, 36.3))
            ThreePointArc((-50, 36.3), (-49.414213562, 37.714213562), (-48, 38.3))
        make_face(mode=Mode.SUBTRACT)
    extrude(amount=BOSS_EXTRUDE6_DEPTH + BOSS_EXTRUDE6_DEPTH_BACK)

    # Sketch10 → Cut-Extrude4 (cut, through all)
    with BuildSketch(Plane.XZ.offset(3)):
        with Locations((10.5, 0)):
            Rectangle(SKETCH10_W, SKETCH10_H)
    extrude(amount=CUT_EXTRUDE4_DEPTH, mode=Mode.SUBTRACT)

    # Fillet10
    fillet10_edges = [part.edges().sort_by_distance(p)[0] for p in [
        (70.621320344, -2, 38.121320344),
        (-49.621320344, -2, -38.121320344),
        (-49.621320344, -2, 38.121320344),
        (70.621320344, -2, -38.121320344),
        (-51.035533906, -2, 39.535533906),
        (10.5, -2, 41),
        (72.035533906, -2, 39.535533906),
        (73.5, -2, 0),
        (72.035533906, -2, -39.535533906),
        (10.5, -2, -41),
        (-51.035533906, -2, -39.535533906),
        (-52.5, -2, 0),
        (10.5, -2, -39),
        (71.5, -2, 0),
        (10.5, -2, 39),
        (-50.5, -2, 0),
    ]]
    fillet(fillet10_edges, radius=FILLET10_R - 0.0001)  # a hair under: the kernel refuses the full size


solid = part.part
